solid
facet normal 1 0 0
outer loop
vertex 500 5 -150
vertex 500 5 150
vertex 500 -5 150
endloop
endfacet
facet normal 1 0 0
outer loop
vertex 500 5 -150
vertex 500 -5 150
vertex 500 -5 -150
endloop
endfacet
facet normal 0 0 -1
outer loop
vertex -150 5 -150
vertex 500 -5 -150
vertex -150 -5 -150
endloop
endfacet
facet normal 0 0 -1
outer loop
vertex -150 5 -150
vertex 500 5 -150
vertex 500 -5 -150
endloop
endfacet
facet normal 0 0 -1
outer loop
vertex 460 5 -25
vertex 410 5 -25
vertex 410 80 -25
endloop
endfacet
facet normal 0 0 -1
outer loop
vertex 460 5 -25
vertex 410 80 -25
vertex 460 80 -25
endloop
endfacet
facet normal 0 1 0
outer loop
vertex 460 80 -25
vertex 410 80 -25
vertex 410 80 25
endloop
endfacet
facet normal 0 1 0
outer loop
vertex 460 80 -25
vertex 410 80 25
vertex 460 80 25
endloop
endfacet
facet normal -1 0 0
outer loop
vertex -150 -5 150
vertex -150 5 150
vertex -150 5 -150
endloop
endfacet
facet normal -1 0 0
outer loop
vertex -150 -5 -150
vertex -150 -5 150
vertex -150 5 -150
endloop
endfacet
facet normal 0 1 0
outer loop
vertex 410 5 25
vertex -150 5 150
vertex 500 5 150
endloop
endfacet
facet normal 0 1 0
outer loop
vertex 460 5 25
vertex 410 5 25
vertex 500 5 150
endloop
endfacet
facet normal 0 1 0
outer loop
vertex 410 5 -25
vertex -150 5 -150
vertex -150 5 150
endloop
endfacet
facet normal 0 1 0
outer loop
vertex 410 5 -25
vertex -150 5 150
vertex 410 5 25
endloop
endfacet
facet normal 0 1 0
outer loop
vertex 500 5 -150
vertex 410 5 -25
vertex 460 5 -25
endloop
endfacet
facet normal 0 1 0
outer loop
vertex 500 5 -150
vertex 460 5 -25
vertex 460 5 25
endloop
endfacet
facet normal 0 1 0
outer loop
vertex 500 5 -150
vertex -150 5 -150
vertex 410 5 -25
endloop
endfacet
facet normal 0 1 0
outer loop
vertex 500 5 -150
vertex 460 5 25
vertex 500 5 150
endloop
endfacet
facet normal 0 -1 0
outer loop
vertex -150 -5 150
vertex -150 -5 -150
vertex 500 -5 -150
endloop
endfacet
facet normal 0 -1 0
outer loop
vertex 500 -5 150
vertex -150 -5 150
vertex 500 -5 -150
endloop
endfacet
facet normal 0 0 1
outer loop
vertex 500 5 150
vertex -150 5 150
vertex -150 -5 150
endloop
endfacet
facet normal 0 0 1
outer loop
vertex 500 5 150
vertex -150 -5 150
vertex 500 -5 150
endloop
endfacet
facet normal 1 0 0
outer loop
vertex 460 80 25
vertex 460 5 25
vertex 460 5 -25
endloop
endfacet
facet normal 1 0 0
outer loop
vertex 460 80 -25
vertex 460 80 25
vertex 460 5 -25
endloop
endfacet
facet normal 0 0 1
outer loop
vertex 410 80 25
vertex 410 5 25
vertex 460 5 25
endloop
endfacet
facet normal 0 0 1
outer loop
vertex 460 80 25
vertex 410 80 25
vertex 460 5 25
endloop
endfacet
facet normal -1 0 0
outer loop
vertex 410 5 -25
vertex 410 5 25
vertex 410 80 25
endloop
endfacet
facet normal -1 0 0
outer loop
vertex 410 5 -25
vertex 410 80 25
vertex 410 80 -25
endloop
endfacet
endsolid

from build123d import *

# Parameters (mm, degrees)
SKETCH1_W           = 300
SKETCH1_H           = 300
SKETCH1_W_2         = 350
BOSS_EXTRUDE1_DEPTH = 5
SKETCH2_W           = 50
SKETCH2_H           = 50
BOSS_EXTRUDE2_DEPTH = 75


with BuildPart() as part:
    # Sketch1 → Boss-Extrude1 (new body, symmetric)
    with BuildSketch(Plane(origin=(0, 0, 0), x_dir=(1, 0, 0), z_dir=(0, 1, 0))):
        Rectangle(SKETCH1_W, SKETCH1_H)
        with Locations((325, 0)):
            Rectangle(SKETCH1_W_2, SKETCH1_H)
    extrude(amount=BOSS_EXTRUDE1_DEPTH, both=True)

    # Sketch2 → Boss-Extrude2 (add)
    with BuildSketch(Plane(origin=(0, 5, 0), x_dir=(1, 0, 0), z_dir=(0, 1, 0))):
        with Locations((435, 0)):
            Rectangle(SKETCH2_W, SKETCH2_H)
    extrude(amount=BOSS_EXTRUDE2_DEPTH)


solid = part.part
